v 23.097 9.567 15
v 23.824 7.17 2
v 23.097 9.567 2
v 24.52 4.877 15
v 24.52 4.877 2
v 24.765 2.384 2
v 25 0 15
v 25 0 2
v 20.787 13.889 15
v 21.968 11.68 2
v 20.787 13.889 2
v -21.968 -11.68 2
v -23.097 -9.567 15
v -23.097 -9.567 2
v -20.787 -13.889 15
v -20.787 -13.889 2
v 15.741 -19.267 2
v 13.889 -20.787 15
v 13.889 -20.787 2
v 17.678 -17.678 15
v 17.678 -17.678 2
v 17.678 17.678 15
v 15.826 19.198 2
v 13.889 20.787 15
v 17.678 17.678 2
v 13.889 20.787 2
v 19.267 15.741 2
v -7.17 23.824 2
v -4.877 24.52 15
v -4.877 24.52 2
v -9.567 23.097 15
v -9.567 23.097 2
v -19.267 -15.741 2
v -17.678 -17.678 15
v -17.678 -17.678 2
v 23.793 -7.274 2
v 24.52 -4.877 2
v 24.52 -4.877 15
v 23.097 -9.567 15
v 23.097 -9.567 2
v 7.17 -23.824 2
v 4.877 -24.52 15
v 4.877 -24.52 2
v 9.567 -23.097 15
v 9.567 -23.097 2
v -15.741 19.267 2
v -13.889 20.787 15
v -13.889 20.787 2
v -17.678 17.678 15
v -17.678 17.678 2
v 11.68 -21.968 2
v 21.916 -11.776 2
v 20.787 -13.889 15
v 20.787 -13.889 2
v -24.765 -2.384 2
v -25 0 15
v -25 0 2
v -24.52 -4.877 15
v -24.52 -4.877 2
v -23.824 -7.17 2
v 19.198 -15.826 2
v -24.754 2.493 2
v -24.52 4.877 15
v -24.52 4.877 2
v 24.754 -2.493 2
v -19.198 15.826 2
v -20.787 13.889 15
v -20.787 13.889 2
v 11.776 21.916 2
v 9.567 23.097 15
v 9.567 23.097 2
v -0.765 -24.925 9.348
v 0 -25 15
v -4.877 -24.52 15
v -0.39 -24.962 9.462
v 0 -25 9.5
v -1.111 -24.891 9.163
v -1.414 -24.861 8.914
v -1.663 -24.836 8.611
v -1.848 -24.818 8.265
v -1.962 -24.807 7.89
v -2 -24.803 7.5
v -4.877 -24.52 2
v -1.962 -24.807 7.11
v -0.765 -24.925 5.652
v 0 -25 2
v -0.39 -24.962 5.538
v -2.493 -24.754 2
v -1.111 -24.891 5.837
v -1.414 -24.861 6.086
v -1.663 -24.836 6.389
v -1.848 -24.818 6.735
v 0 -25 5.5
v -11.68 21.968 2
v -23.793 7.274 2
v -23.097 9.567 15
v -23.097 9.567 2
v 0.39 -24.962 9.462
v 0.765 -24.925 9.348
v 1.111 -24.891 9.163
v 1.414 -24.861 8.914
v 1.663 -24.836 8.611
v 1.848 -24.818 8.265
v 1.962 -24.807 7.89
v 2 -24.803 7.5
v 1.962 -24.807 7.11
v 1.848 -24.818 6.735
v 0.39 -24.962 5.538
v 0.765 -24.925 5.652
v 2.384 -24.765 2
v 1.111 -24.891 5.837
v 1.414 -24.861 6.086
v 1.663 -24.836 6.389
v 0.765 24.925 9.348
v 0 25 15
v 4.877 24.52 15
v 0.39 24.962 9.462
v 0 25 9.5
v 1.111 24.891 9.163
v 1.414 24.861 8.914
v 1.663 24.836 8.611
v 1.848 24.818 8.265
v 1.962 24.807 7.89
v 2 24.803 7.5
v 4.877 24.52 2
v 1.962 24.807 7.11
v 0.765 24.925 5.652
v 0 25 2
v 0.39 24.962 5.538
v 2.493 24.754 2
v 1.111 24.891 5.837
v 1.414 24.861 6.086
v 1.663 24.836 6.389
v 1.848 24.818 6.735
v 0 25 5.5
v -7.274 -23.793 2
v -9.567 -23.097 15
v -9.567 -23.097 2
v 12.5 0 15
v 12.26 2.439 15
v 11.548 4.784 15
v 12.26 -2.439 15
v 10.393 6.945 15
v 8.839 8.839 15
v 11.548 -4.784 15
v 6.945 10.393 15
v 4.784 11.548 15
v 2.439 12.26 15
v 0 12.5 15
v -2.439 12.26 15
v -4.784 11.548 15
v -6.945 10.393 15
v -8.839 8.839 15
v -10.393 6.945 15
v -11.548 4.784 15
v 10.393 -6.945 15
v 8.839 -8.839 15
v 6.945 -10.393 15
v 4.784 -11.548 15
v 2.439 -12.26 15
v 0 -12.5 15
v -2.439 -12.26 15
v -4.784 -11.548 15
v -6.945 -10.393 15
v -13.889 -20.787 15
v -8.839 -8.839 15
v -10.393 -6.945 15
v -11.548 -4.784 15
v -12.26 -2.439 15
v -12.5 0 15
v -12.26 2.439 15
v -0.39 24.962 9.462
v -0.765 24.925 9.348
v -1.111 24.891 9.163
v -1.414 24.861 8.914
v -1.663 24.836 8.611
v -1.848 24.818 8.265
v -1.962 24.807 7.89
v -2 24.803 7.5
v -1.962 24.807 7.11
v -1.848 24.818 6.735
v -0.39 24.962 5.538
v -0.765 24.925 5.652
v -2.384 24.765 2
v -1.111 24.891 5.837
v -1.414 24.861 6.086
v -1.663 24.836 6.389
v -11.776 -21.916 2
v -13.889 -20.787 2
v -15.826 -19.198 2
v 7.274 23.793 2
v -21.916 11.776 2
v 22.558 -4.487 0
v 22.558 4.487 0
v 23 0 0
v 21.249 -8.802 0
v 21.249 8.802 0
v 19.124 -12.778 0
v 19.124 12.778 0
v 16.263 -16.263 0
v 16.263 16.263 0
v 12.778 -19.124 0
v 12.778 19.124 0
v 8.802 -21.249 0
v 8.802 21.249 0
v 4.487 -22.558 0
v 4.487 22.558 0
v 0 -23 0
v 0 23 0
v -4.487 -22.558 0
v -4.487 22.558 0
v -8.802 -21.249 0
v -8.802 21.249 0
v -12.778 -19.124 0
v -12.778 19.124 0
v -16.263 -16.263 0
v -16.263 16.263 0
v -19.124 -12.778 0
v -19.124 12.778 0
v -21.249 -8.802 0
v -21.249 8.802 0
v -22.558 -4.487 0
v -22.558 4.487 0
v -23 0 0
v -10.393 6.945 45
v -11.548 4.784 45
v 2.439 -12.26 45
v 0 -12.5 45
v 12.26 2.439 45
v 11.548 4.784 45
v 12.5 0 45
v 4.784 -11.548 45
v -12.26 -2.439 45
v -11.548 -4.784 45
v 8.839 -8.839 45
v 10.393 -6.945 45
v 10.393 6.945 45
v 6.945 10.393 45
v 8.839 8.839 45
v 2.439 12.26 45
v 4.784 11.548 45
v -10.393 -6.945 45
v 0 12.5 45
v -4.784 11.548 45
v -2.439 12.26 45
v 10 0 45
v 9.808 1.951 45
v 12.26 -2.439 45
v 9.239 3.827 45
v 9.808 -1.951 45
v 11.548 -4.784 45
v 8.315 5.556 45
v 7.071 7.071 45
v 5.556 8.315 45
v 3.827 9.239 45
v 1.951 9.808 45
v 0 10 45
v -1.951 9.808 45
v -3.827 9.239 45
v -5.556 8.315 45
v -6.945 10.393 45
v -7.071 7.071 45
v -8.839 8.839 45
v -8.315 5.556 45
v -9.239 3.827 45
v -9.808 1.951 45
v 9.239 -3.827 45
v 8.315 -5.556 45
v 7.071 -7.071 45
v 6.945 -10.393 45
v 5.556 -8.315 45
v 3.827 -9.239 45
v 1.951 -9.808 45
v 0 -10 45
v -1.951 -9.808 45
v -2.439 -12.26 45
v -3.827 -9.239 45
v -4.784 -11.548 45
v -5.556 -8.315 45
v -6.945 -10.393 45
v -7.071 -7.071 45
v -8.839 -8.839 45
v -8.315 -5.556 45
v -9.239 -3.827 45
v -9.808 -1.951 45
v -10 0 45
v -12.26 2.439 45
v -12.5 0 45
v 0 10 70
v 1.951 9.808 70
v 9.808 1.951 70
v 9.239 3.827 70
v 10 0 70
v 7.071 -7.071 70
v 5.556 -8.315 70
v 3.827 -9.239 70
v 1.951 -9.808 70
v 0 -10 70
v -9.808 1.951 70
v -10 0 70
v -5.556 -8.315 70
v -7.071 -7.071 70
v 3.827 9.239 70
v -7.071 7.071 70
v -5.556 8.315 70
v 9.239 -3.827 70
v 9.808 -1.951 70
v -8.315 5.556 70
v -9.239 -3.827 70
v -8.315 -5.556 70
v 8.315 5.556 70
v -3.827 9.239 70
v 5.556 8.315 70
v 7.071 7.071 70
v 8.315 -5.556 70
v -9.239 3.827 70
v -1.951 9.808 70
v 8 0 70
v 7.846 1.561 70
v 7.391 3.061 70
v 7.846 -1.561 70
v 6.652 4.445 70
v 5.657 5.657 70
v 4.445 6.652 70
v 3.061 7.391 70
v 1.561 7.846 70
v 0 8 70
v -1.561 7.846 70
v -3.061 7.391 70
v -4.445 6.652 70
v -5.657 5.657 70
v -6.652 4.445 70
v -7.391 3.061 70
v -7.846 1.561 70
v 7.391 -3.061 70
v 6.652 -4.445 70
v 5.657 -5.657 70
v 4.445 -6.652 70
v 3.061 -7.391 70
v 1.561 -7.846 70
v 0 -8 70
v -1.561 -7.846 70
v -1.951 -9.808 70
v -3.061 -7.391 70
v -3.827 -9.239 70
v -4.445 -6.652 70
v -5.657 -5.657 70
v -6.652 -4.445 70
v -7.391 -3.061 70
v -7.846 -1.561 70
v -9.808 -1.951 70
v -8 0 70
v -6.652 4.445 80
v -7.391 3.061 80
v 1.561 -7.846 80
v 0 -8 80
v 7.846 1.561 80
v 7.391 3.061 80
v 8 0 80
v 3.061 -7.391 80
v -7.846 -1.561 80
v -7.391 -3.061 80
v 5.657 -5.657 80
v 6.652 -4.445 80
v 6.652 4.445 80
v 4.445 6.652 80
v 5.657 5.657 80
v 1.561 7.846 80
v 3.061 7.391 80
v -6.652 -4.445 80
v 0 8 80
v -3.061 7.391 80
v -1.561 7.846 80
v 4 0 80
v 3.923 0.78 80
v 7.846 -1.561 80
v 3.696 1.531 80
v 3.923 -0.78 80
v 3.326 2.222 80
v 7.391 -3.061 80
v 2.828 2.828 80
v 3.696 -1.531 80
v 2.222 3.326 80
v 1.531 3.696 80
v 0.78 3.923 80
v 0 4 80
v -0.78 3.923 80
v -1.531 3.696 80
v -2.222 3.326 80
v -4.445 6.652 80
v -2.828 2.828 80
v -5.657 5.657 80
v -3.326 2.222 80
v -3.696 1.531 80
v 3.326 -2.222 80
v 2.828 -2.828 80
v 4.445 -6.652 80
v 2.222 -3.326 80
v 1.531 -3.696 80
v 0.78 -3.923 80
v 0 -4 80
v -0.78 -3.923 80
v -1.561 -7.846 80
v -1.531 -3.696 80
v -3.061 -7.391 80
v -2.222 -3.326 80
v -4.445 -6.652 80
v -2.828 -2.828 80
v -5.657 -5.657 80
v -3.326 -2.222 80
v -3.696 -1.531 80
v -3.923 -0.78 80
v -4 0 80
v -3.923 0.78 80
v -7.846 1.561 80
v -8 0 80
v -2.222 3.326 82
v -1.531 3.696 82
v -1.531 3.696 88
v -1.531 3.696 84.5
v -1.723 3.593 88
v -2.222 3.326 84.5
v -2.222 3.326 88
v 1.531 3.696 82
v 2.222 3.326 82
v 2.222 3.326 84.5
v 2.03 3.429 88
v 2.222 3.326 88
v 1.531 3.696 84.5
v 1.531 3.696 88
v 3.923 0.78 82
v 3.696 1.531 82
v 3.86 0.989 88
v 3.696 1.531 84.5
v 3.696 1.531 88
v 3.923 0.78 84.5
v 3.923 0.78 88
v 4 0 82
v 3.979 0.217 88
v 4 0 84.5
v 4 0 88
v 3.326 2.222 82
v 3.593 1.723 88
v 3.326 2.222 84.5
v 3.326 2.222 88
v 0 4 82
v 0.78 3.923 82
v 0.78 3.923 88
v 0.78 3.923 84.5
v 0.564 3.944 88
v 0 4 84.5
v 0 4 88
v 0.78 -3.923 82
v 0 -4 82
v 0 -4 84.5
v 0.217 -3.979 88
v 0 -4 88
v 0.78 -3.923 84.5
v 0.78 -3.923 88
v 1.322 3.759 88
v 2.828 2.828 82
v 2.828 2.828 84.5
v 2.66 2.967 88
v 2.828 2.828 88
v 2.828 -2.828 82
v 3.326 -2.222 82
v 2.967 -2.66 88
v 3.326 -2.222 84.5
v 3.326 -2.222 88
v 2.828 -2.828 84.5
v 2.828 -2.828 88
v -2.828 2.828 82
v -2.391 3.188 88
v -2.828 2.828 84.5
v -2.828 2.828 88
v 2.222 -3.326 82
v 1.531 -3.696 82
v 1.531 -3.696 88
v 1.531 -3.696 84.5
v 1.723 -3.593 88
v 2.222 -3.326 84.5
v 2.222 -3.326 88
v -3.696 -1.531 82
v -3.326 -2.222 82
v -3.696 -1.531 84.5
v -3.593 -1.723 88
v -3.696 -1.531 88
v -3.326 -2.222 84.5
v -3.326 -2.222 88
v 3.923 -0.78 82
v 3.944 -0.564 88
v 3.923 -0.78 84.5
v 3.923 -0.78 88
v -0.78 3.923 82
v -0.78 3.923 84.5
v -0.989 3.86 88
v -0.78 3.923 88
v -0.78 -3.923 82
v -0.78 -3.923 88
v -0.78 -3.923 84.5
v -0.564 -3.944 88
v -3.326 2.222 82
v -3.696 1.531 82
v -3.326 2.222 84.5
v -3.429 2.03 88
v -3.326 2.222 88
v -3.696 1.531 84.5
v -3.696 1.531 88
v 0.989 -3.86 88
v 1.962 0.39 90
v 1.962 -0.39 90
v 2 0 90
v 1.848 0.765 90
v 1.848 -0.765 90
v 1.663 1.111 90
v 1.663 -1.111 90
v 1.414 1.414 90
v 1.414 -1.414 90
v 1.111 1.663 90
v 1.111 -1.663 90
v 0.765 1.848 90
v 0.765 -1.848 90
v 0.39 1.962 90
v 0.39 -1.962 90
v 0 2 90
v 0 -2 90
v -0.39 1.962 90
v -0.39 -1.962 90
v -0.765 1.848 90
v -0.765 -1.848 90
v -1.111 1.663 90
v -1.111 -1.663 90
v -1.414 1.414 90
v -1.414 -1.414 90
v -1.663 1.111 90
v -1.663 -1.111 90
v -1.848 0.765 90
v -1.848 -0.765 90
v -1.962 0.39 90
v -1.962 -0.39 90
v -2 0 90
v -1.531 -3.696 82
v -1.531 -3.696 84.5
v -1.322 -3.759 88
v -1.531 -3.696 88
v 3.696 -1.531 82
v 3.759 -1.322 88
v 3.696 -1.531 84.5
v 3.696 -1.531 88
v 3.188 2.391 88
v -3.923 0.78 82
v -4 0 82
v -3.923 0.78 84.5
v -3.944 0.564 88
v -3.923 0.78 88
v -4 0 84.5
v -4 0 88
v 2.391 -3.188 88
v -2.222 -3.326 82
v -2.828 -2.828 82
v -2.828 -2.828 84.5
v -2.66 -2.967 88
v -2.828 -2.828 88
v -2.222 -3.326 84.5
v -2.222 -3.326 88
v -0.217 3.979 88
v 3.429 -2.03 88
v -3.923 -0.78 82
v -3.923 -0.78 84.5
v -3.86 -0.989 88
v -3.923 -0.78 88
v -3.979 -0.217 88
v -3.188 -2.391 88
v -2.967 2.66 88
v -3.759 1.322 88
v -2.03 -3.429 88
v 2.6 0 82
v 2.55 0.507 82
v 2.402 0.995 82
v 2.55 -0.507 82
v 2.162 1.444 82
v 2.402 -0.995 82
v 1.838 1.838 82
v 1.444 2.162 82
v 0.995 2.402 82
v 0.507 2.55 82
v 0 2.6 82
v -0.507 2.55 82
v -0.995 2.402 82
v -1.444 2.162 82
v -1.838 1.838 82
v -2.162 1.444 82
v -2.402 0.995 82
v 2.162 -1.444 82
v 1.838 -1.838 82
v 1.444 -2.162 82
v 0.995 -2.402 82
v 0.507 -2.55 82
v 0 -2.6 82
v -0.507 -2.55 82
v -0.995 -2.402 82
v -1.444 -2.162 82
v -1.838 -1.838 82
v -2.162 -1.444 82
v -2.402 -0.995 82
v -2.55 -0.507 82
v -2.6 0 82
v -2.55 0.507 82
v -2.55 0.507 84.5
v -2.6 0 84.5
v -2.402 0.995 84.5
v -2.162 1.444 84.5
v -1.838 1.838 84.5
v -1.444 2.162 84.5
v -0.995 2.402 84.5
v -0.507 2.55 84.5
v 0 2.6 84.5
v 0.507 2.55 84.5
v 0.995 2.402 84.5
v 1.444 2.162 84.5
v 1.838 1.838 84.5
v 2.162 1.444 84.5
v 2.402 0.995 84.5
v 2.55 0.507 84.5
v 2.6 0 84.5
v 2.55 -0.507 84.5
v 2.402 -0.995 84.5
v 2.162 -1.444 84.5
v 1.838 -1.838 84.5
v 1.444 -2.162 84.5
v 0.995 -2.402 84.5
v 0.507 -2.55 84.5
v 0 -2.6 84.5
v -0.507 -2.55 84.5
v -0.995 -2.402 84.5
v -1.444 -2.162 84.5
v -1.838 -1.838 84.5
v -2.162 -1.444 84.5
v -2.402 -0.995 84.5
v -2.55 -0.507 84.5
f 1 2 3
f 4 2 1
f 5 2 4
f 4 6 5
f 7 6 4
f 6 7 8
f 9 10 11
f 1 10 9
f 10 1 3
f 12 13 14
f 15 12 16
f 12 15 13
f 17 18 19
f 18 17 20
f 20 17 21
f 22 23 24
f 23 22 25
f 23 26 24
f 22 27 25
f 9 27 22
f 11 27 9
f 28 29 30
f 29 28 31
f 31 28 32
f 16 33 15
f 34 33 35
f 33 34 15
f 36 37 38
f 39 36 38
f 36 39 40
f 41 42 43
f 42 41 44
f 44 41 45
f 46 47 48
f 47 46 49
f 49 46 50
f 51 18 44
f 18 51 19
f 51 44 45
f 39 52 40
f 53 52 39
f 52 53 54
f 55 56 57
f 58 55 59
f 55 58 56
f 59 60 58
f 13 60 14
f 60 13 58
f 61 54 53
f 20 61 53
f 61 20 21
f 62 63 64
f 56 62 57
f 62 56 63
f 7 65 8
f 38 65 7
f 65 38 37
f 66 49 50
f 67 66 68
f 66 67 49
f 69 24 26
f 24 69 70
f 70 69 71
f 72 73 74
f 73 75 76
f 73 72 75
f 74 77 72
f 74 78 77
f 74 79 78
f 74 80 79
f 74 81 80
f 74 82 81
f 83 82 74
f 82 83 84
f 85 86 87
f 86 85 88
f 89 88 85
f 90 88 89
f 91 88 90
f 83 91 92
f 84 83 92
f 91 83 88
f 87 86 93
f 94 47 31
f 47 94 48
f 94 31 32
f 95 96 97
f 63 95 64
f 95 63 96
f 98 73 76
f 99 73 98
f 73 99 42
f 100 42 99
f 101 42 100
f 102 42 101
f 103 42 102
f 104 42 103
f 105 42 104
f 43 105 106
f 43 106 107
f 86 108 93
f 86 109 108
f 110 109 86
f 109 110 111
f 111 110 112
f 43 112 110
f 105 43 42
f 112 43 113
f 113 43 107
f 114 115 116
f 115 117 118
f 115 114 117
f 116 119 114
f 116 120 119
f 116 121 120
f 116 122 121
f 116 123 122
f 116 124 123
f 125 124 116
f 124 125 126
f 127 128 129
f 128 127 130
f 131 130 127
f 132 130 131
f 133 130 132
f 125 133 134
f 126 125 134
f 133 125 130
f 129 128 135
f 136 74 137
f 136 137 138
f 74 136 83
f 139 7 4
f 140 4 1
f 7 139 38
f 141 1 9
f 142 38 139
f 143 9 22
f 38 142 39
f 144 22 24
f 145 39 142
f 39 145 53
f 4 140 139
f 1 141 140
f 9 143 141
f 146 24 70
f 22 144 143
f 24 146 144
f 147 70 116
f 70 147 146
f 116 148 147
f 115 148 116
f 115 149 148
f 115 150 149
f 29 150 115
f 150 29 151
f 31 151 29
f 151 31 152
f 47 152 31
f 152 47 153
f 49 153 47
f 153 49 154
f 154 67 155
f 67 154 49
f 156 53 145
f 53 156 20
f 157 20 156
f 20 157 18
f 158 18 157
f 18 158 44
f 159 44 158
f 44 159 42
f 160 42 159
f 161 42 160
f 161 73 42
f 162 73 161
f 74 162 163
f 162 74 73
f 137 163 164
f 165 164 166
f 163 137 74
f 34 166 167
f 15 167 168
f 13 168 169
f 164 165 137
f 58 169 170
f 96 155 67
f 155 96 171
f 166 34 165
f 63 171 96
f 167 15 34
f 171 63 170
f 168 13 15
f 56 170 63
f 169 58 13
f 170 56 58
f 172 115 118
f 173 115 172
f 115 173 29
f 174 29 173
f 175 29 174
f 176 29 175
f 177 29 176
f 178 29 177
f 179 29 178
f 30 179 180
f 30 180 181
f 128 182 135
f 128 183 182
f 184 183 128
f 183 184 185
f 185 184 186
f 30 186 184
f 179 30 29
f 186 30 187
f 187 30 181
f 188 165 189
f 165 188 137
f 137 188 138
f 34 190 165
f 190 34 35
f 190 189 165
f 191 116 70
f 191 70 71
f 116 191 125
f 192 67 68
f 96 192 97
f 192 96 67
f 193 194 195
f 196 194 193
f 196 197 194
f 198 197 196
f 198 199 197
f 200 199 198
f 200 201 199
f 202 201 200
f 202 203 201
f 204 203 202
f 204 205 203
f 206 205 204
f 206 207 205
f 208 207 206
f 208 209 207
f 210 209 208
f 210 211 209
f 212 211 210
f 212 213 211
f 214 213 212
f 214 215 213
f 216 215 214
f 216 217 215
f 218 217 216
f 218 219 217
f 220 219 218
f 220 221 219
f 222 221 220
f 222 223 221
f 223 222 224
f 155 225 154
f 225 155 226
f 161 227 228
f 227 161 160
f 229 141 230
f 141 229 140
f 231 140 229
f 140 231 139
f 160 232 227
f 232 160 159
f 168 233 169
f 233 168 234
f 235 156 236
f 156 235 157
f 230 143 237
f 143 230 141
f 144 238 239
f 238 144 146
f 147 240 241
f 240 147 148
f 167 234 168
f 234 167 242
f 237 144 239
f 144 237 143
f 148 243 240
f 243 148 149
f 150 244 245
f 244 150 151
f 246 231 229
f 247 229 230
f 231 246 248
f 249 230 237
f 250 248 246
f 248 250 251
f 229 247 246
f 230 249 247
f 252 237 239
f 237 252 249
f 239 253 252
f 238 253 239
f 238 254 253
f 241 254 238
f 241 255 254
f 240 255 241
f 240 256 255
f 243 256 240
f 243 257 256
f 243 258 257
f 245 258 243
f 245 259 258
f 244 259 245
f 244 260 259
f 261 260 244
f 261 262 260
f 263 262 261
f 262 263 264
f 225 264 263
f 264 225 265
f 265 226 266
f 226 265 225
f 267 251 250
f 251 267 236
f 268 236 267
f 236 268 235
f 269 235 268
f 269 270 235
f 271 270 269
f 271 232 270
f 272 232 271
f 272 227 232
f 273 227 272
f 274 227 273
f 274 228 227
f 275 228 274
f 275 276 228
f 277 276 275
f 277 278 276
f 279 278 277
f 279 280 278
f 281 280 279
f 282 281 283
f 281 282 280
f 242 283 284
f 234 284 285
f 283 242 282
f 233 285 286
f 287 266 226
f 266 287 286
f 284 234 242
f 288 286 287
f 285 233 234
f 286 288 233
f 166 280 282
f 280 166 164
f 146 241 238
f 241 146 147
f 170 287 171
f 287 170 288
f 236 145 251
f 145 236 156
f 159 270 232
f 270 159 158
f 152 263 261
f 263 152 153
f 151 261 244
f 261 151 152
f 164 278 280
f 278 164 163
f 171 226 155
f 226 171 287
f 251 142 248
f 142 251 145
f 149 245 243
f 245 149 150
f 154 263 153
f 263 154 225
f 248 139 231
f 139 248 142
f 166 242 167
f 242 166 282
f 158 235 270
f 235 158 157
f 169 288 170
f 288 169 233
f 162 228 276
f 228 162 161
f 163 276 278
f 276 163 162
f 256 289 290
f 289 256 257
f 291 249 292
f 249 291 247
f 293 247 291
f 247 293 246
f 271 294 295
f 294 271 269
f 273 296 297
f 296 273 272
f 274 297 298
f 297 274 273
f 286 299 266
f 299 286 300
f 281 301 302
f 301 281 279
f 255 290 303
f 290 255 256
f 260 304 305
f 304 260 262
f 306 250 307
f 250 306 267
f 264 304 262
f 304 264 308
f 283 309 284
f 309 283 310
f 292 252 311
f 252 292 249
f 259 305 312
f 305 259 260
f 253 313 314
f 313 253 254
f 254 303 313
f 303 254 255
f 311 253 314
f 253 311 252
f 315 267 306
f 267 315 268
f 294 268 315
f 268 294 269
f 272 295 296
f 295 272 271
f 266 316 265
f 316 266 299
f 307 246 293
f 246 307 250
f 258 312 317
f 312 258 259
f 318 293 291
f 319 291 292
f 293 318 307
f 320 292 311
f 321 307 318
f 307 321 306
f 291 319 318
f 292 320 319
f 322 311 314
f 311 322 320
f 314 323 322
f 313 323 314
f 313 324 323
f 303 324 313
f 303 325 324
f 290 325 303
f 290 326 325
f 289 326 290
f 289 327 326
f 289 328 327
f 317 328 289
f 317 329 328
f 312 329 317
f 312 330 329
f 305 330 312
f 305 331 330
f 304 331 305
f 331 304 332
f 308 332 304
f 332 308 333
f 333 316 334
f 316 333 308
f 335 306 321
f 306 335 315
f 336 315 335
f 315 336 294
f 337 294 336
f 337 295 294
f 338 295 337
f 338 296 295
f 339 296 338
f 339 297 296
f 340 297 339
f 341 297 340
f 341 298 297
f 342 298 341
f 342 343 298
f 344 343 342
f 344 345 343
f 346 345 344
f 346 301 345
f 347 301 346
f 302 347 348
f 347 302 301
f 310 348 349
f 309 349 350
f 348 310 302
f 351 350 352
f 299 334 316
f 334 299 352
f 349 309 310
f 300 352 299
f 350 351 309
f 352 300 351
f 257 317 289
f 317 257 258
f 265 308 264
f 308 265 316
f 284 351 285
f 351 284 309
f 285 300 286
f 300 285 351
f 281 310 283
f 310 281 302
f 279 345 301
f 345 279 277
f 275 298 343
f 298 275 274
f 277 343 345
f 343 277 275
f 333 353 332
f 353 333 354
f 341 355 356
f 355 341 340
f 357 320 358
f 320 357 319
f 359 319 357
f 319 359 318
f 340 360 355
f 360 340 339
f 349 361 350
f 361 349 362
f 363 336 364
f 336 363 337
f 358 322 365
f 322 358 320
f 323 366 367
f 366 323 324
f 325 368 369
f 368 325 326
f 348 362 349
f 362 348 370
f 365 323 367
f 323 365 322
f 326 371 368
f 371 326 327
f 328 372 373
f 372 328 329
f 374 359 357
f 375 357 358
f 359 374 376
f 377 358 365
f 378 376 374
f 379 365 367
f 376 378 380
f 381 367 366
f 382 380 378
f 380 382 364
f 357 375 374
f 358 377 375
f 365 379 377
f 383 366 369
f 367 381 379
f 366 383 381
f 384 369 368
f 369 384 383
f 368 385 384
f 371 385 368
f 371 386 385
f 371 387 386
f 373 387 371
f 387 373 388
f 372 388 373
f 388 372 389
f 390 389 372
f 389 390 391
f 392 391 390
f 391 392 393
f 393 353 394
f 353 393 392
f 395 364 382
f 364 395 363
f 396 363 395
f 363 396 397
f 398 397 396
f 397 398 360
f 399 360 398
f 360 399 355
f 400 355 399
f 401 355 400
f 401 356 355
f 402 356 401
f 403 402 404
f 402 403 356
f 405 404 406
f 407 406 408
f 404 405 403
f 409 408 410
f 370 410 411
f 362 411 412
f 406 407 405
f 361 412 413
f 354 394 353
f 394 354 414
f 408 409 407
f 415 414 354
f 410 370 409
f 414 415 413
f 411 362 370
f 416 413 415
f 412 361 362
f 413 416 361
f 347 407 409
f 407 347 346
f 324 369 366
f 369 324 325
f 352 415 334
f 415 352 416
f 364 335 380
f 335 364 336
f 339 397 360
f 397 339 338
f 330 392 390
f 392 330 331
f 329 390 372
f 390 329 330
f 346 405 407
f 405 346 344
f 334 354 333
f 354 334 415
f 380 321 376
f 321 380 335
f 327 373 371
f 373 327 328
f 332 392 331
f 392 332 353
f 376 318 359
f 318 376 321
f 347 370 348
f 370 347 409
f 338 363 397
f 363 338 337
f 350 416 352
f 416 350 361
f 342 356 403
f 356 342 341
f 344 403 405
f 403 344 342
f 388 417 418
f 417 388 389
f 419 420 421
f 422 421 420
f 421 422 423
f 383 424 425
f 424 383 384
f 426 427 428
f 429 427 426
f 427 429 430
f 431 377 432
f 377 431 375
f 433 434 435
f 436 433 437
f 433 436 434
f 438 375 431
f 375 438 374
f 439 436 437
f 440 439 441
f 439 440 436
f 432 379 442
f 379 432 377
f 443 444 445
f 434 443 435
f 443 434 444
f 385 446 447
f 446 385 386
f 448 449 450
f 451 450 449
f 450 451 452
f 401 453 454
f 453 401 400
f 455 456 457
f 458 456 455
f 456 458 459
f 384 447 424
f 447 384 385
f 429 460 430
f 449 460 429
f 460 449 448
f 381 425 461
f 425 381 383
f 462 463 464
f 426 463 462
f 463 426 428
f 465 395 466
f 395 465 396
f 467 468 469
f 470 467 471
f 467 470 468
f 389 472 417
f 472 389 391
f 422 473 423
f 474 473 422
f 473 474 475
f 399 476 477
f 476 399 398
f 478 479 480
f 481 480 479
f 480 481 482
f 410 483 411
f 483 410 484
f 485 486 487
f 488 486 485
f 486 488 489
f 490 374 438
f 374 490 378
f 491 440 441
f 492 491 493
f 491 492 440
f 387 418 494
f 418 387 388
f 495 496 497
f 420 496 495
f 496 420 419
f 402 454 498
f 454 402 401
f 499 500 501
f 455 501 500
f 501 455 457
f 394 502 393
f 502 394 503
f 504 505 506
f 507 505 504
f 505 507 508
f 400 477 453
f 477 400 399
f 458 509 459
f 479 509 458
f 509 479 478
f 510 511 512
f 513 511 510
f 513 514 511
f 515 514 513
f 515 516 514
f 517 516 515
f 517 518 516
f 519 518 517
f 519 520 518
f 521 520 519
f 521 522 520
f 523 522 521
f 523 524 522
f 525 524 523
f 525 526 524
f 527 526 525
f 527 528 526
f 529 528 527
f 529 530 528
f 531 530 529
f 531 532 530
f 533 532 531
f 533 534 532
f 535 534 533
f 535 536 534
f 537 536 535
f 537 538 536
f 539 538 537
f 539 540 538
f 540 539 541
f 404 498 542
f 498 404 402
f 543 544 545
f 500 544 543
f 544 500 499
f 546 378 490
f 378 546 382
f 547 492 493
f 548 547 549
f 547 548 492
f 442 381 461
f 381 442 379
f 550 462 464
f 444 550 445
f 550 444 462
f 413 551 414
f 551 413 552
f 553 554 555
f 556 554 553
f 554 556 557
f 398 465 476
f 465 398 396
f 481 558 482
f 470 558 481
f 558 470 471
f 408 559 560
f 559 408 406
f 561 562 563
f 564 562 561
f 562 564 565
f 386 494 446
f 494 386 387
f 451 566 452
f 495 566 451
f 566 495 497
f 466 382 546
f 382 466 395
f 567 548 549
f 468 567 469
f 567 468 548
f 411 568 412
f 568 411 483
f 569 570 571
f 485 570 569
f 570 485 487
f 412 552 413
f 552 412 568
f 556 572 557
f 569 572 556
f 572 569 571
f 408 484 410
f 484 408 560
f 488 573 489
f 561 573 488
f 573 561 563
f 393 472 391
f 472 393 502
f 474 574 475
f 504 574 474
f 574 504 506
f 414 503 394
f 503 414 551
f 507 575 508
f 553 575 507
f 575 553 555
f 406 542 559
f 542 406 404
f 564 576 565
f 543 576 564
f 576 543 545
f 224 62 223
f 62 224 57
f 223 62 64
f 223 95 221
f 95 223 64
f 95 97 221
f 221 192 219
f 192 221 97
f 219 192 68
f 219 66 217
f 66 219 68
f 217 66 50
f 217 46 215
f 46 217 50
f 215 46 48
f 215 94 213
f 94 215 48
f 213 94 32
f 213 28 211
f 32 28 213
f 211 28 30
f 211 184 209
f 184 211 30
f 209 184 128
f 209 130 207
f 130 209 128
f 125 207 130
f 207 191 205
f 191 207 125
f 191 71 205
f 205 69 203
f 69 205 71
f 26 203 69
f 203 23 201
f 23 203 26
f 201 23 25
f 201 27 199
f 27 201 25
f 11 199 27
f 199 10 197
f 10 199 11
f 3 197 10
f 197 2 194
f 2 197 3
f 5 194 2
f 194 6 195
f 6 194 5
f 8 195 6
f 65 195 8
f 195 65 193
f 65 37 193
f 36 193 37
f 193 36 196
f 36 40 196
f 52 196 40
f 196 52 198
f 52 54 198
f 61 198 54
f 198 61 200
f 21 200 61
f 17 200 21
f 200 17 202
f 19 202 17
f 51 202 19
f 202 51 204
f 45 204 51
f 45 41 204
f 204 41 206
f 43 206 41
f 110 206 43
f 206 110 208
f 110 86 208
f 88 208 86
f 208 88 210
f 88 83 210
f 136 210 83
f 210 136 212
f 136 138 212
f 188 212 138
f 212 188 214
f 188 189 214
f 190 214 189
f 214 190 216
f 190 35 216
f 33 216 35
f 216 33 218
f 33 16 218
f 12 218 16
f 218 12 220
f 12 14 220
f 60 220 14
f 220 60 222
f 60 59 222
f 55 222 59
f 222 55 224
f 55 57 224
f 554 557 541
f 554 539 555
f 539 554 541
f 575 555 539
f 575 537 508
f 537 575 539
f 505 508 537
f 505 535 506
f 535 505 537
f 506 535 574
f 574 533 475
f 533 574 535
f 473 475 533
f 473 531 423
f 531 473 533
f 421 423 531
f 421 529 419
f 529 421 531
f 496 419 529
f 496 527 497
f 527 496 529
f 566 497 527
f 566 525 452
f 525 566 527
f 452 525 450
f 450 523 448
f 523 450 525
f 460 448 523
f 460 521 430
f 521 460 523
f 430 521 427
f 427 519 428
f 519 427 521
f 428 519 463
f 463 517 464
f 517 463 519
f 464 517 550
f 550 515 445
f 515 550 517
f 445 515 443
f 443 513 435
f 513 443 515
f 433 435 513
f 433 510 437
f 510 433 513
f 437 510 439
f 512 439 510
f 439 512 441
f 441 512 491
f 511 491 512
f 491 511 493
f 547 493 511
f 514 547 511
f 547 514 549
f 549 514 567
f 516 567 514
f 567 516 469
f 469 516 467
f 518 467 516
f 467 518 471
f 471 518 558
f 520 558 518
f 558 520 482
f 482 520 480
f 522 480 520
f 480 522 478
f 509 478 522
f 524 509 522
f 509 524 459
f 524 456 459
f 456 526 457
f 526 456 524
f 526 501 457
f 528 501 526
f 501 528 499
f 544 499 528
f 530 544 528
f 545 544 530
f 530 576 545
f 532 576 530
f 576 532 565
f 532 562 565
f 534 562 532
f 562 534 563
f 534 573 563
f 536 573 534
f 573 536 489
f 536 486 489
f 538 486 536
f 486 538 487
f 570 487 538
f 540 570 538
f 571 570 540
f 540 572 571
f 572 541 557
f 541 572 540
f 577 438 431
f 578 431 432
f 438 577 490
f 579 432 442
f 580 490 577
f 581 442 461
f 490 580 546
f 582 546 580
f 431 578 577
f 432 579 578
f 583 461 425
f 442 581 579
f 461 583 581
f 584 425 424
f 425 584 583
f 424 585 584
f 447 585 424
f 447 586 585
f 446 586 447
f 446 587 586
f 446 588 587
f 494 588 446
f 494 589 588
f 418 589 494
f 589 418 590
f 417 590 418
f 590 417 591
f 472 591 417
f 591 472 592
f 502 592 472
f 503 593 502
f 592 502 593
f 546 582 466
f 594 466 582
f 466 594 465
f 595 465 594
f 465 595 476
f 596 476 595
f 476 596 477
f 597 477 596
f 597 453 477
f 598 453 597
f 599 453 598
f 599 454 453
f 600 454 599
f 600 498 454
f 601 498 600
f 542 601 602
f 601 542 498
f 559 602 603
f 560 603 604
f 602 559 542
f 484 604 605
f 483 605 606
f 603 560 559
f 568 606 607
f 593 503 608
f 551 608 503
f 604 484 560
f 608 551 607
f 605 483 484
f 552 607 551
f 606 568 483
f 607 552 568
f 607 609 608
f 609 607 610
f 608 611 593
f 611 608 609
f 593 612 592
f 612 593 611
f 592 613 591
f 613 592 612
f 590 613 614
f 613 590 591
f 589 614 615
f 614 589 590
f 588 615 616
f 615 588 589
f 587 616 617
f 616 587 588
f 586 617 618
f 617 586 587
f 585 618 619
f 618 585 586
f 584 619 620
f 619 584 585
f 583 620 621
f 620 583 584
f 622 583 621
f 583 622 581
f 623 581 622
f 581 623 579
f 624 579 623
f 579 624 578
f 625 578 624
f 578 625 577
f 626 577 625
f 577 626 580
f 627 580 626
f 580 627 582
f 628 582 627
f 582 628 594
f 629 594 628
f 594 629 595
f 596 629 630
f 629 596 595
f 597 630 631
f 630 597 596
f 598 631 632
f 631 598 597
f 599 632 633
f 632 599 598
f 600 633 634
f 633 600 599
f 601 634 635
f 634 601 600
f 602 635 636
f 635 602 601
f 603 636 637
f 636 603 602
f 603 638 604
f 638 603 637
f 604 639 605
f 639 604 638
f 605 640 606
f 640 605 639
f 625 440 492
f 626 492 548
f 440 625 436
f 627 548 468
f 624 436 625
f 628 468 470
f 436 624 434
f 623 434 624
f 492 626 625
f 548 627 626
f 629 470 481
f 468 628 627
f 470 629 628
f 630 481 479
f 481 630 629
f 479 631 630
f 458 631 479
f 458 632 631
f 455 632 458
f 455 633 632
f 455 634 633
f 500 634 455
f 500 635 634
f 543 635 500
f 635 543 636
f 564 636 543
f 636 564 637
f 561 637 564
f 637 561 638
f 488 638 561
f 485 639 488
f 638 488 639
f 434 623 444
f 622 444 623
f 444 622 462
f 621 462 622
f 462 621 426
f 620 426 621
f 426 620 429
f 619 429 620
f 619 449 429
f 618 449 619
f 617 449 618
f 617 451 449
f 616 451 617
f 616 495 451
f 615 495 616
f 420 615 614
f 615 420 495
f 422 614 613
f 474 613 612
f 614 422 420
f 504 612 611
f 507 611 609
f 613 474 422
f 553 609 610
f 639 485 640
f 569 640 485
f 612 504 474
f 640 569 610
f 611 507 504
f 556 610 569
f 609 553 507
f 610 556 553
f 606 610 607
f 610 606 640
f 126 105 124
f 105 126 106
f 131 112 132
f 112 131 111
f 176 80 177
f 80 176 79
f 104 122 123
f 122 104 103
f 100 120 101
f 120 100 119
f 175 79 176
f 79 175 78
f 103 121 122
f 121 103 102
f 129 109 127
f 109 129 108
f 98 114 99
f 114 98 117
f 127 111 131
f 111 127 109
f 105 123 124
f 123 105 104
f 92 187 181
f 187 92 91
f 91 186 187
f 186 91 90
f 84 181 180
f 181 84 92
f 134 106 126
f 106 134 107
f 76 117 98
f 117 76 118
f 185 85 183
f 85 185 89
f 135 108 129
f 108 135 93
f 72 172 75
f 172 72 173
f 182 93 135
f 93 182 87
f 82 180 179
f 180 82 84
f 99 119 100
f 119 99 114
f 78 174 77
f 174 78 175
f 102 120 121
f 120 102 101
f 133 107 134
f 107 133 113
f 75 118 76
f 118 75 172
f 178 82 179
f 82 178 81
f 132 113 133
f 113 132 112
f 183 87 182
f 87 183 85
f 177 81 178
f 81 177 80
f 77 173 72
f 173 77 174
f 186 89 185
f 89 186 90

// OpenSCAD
$fn = 32;

// ----------------------------------------------------------------------
// Stepped shaft: diameters 50, 25, 20, 16, 8 mm, 90 mm long
// ----------------------------------------------------------------------

// --- parameters (mm) ---
d1 = 50;                  // step 1 diameter
len1 = 15;                // step 1 length
d2 = 25;                  // step 2 diameter
len2 = 30;                // step 2 length
d3 = 20;                  // step 3 diameter
len3 = 25;                // step 3 length
d4 = 16;                  // step 4 diameter
len4 = 10;                // step 4 length
d5 = 8;                   // step 5 diameter
len5 = 10;                // step 5 length
total = 90;               // overall length
chamfer = 2;              // end chamfer
groove_r = 4;             // groove radius
groove_z = 82;            // groove position from the end
groove_w = 2.5;           // groove width
groove_d = 1.4;           // groove depth
cross_d = 4;              // cross pin hole
cross_z = 7.5;            // cross hole position

difference() {
  /* turned body: stacked cylinders, every step sunk into the bigger one */
  union() {
    cylinder(h = len1, d = d1);
    translate([0, 0, 14.6]) cylinder(h = 30.4, d = d2);
    translate([0, 0, 44.6]) cylinder(h = 25.4, d = d3);
    translate([0, 0, 69.6]) cylinder(h = 10.4, d = d4);
    translate([0, 0, 79.6]) cylinder(h = 10.4, d = d5);
  }
  /* bottom chamfer ring cut */
  rotate_extrude() translate([23, -2.5]) polygon([[0, 0], [4.5, 0], [4.5, 7], [0, 2.5]]);
  /* top chamfer ring cut */
  rotate_extrude() translate([2, 90]) polygon([[0, 0], [4.5, -4.5], [4.5, 2.5], [0, 2.5]]);
  /* circlip groove just behind the shoulder */
  rotate_extrude() translate([groove_r - groove_d, groove_z]) square([groove_d + 2.5, groove_w]);
  /* cross pin hole through the small step */
  translate([0, 0, cross_z]) rotate([90, 0, 0]) cylinder(h = d1 + 5, d = cross_d, center = true);
}
